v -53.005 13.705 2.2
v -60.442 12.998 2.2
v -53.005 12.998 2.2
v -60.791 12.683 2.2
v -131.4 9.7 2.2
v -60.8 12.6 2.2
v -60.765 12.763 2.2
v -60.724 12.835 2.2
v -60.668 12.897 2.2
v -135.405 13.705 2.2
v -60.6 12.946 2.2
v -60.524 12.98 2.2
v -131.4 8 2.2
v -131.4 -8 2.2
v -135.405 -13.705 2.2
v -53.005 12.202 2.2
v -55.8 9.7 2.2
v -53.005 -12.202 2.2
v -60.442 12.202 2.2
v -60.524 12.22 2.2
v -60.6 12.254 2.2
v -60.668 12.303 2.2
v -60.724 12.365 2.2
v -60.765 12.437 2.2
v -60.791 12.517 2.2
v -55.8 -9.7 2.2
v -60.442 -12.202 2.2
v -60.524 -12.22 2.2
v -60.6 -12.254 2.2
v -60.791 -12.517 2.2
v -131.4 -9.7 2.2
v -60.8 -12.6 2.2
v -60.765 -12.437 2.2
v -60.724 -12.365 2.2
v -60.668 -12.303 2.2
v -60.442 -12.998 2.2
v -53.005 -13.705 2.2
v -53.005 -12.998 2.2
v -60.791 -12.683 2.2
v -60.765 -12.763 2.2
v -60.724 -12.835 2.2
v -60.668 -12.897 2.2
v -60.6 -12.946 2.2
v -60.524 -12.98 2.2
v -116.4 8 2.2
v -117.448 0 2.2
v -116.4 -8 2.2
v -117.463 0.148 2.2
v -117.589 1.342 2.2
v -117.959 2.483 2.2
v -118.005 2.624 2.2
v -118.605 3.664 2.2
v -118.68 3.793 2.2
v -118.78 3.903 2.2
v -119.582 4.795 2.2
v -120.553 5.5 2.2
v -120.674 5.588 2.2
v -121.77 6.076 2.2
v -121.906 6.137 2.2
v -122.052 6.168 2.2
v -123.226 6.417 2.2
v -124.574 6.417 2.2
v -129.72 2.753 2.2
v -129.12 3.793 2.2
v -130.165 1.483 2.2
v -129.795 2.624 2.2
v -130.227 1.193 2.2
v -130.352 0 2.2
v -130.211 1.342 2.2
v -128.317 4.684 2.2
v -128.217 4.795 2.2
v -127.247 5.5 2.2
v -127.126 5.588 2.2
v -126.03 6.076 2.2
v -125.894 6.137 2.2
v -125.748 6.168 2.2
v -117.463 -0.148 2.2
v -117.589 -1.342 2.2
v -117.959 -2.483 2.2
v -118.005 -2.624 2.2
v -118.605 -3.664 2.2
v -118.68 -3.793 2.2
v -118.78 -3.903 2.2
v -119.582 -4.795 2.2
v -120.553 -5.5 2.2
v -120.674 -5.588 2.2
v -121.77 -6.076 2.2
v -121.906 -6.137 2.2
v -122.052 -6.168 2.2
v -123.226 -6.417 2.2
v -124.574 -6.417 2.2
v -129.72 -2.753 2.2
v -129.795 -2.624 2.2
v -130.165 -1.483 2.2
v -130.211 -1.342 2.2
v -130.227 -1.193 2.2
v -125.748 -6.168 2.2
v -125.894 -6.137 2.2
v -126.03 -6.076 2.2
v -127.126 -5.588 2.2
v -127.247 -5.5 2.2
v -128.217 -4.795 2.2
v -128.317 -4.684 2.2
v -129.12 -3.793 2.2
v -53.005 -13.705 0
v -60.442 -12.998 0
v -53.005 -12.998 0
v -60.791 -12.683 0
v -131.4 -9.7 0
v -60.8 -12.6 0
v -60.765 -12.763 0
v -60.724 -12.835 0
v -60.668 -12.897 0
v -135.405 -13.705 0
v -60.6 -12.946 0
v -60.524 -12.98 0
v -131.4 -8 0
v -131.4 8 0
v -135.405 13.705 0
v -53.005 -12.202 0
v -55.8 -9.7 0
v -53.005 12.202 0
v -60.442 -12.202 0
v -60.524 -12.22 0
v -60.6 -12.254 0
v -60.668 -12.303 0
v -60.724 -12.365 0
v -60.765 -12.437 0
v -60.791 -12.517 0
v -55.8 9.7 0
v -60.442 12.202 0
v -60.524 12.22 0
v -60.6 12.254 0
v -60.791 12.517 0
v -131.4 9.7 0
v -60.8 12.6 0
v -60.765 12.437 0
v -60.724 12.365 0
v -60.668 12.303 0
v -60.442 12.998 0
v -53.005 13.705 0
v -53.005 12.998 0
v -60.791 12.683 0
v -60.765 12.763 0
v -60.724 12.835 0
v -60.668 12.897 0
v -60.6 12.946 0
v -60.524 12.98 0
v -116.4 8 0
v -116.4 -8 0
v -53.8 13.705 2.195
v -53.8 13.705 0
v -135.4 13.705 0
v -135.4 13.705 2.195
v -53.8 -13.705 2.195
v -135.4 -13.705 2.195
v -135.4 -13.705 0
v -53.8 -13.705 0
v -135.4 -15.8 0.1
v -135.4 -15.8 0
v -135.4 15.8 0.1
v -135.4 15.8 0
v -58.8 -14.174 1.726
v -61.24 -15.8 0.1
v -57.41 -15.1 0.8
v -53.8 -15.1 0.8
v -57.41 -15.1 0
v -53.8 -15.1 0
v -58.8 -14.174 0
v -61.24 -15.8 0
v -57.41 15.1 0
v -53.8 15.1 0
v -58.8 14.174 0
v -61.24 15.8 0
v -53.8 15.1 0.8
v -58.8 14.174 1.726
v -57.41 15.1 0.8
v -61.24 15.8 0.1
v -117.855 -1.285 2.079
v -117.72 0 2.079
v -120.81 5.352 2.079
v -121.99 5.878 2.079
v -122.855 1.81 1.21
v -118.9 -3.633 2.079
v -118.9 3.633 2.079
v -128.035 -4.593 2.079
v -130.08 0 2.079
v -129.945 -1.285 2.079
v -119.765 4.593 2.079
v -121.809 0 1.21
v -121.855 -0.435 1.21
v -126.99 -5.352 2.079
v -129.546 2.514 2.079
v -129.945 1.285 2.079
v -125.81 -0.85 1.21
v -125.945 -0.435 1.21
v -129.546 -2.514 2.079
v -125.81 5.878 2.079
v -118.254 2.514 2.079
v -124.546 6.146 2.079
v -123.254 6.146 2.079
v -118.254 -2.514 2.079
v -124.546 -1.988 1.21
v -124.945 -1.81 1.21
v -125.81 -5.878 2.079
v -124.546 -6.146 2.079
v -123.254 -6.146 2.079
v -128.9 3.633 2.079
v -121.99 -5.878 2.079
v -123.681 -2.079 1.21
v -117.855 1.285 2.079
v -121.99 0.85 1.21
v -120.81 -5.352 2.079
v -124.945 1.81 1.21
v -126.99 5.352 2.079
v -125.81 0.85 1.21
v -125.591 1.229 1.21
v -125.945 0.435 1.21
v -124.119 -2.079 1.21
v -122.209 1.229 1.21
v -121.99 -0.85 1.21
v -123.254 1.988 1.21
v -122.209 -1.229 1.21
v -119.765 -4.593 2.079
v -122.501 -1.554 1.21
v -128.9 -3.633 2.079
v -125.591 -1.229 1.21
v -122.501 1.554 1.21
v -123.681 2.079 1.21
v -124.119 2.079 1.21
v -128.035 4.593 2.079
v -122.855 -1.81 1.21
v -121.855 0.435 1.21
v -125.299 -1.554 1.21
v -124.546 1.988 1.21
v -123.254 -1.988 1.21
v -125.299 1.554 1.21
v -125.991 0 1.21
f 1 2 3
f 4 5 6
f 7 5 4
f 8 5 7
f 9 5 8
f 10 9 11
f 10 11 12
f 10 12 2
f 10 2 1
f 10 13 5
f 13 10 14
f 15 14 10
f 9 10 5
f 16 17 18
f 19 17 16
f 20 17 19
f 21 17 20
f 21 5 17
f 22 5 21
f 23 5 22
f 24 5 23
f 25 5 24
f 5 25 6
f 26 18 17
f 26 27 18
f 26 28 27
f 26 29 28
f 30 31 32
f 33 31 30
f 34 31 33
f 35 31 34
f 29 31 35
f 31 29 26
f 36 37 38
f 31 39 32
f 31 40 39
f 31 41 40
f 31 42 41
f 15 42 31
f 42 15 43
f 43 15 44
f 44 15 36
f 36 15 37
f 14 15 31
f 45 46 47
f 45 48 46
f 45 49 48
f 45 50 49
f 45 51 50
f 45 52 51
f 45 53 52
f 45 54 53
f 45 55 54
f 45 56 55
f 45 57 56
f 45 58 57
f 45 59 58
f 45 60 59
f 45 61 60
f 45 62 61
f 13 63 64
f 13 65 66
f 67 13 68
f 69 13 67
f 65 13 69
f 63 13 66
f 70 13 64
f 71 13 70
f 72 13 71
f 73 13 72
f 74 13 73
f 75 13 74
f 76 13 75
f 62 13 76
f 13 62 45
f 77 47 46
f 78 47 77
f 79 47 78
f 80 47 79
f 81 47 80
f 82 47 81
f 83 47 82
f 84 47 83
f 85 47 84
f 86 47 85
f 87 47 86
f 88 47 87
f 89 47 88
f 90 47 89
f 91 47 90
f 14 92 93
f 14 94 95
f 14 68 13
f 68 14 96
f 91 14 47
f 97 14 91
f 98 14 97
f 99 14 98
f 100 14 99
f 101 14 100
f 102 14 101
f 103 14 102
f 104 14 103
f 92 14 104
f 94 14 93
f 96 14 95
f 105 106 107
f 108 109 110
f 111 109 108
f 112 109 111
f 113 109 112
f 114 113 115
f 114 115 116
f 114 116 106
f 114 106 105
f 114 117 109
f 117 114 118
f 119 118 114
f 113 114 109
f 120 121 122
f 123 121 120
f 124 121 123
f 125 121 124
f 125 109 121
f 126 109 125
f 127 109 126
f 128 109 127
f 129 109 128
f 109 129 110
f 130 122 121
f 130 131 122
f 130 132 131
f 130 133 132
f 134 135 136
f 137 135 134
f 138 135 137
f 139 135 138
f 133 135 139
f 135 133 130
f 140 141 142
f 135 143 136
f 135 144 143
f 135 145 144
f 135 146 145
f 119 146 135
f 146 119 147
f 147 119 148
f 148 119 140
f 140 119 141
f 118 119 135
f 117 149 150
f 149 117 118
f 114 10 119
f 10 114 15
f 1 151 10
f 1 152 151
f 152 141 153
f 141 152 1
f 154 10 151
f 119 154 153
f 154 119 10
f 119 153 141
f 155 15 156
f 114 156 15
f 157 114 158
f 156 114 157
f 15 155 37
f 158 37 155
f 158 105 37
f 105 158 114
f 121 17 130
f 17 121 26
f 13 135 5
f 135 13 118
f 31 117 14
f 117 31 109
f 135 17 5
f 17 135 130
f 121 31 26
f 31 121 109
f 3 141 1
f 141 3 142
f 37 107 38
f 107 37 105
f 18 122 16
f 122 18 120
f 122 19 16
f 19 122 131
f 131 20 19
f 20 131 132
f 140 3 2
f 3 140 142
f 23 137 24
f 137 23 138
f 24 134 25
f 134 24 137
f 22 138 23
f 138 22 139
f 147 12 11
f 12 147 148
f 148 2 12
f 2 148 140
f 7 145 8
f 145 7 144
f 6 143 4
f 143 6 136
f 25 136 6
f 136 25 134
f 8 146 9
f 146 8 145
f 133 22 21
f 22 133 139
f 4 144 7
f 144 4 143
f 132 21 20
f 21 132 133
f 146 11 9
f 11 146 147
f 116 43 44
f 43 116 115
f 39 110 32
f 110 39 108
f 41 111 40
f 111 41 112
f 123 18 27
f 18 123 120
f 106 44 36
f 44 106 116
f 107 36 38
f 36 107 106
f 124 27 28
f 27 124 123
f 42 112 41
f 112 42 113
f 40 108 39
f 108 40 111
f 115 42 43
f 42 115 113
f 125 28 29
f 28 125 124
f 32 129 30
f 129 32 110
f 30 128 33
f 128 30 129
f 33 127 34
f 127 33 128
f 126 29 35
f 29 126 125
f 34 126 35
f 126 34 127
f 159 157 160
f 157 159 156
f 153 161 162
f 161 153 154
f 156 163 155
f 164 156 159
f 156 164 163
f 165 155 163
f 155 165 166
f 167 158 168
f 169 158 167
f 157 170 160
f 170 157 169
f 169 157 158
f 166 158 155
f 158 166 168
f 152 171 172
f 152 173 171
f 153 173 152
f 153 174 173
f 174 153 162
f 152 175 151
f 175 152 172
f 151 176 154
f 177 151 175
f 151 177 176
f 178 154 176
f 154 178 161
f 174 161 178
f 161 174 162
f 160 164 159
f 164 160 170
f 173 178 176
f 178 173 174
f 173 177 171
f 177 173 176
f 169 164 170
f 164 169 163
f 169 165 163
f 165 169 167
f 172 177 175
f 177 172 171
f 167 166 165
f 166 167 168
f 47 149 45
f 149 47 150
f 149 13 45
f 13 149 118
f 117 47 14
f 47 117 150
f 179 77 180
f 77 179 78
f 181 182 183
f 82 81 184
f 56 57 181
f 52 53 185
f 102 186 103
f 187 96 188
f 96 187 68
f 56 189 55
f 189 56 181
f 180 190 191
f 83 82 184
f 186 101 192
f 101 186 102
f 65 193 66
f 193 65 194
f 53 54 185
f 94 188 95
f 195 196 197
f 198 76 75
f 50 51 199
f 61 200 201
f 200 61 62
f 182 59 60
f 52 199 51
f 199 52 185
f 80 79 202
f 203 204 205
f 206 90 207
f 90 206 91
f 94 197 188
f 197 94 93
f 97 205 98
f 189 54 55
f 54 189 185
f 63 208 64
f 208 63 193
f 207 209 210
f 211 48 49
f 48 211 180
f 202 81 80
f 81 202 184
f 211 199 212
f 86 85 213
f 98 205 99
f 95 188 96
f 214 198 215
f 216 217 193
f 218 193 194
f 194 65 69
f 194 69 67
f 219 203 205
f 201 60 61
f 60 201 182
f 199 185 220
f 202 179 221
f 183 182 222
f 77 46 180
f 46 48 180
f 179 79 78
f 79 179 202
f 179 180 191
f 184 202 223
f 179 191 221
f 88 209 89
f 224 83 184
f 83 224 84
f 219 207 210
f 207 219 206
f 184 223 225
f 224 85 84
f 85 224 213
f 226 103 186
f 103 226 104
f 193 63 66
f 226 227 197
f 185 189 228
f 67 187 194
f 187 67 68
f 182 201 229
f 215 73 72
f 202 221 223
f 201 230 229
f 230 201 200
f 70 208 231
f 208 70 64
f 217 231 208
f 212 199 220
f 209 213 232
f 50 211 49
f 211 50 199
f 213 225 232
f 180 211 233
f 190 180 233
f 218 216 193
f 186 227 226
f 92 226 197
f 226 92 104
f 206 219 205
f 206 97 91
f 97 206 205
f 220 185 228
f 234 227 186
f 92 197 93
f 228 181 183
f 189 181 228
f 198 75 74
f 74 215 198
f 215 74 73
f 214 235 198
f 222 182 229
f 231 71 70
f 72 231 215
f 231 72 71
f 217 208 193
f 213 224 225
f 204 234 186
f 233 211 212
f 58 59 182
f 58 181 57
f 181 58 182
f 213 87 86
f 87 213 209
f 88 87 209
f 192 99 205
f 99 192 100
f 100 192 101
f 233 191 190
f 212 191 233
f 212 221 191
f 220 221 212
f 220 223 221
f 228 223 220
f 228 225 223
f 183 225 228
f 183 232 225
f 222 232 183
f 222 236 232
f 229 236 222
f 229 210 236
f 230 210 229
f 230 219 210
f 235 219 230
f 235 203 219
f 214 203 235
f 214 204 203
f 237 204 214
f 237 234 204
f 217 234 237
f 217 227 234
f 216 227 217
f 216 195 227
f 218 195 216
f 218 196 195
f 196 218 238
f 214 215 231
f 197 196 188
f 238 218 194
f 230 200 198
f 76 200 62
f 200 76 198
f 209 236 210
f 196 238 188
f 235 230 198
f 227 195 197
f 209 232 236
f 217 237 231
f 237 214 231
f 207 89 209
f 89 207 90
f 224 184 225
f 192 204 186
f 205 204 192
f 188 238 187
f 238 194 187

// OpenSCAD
$fn=30;

/* [Global] */

// Render
Objects = "Lid"; //  [Both, Box, Lid]

// use the following syntax to add 1 or more internal x compartment lengths (mm)
y_sizes = [28];
// use the following syntax to add 1 or more internal y compartment widths (mm)
x_sizes = [40,40];
// Total height including Lid
z_size = 25;

addScurve = true;
internalDiameter = 3;
externalDiameter = 1;
copies = 1;

// Type of lid pattern
gPattern = "none"; //  [Hex, Diamond, Web, Solid, Fancy]
// Tolerance
gTol = 0.3;
// Wall Thickness
gWT = 1.2;

/* [Spider Web] */
// Amount of space from one ring or webs to the next
WebSpacing = 10;
// How many rings of webs, best of more than needed
WebStrands = 5;
// Thickness of the strands
WedThickness = 1.8;
// How many segments of web
WebWedges = 12;


/* [Hidden] */
/* Private variables */

// Box Height
TotalZ = z_size;
LidH = 2.2;
RailThick = 1.4;
RailWidth = LidH + RailThick;

function SumList(list, start, end) = (start == end) ? 0 : list[start] + SumList(list, start+1, end);
// Box Length
TotalX = SumList(x_sizes,0,len(x_sizes)) + gWT*(len(x_sizes)+1);
// Box Width 
TotalY = SumList(y_sizes,0,len(y_sizes)) + RailWidth*2 + gWT*(len(y_sizes)-1);

echo("Size: ",TotalX,TotalY);
   
// Height not counting the lid
AdjBoxHeight = TotalZ - LidH;

 module regular_polygon(order, r=1){
 	angles=[ for (i = [0:order-1]) i*(360/order) ];
 	coords=[ for (th=angles) [r*cos(th), r*sin(th)] ];
 	polygon(coords);
 }

module circle_lattice(ipX, ipY, Spacing=10, Walls=1.2)  {


   intersection() {
      square([ipX,ipY]); 
      union() {
	    for (x=[-Spacing:Spacing:ipX+Spacing]) {
           for (y=[-Spacing:Spacing:ipY+Spacing]){
	          difference()  {
			     translate([x+Spacing/2, y+Spacing/2]) circle(r=Spacing*0.75);
			     translate([x+Spacing/2, y+Spacing/2]) circle(r=(Spacing*0.75)-Walls);
		      }
           }   // end for y        
	    }  // end for x
      } // End union
   }
}


module diamond_lattice(ipX, ipY, DSize, WSize)  {

    lOffset = DSize + WSize;

	difference()  {
		square([ipX, ipY]);
		for (x=[0:lOffset:ipX]) {
            for (y=[0:lOffset:ipY]){
  			   translate([x, y])  regular_polygon(4, r=DSize/2);
			   translate([x+lOffset/2, y+lOffset/2]) regular_polygon(4, r=DSize/2);
		    }
        }        
	}
}

module hex_lattice(ipX, ipY, DSize, WSize)  {
    lXOffset = DSize + WSize;
    lYOffset = (DSize + WSize) * sqrt(3);
    r = DSize / sqrt(3);
    
    startXOffset = - lXOffset * ceil(ipX / lXOffset); 
    startYOffset = - lYOffset * ceil(ipY / lYOffset); 
    
    translate([ipX/2,ipY/2])
	difference()  {
		translate([ipX/-2,ipY/-2])
        square([ipX, ipY]);
        
		for (x=[startXOffset:lXOffset:ipX]) {
            for (y=[startYOffset:lYOffset:ipY]){
  			   translate([x, y]) rotate([0,0,30]) regular_polygon(6, r=r);
			   translate([x+lXOffset/2, y+lYOffset/2]) rotate([0,0,30]) regular_polygon(6, r=r);
		    }
        }  
	}
}

// Make a star with X points
module star(radius, wedges)
{
	angle = 360 / wedges;
	difference() {
		circle(radius, $fn = wedges);
		for(i = [0:wedges - 1]) {
			rotate(angle / 2 + angle * i) translate([radius, 0, 0]) 
			    scale([0.8, 1, 1]) 
				    circle(radius * sin(angle / 2), $fn = 24);
		}
	}
}

module spider_web(ipWebSpacing, strands, ipThickness, wedges) 
{
	for(i = [0:strands - 1]) 
    {
        difference() {
            star(ipWebSpacing * i, wedges);
            offset(r = -ipThickness) star(ipWebSpacing * i, wedges);
        }
	}

	angle = 360 / wedges;
	for(i = [0:wedges - 1])
    {
		rotate(angle * i) translate([0, -ipThickness / 2, 0]) 
			square([ipWebSpacing * strands, ipThickness]);
	}    
}


module RCube(x,y,z,ipR=4) {
    translate([-x/2,-y/2,0]) hull(){
      translate([ipR,ipR,ipR]) sphere(ipR);
      translate([x-ipR,ipR,ipR]) sphere(ipR);
      translate([ipR,y-ipR,ipR]) sphere(ipR);
      translate([x-ipR,y-ipR,ipR]) sphere(ipR);
      translate([ipR,ipR,z-ipR]) sphere(ipR);
      translate([x-ipR,ipR,z-ipR]) sphere(ipR);
      translate([ipR,y-ipR,z-ipR]) sphere(ipR);
      translate([x-ipR,y-ipR,z-ipR]) sphere(ipR);
      }  
} 

module lid2(pattern, totalX, totalY, padding, lidHeight, railWidth, tolerance, fingerCutout = true, backstop = 1) {
     lidX = totalX - backstop - .1; //remove backstop from lid
     lidY = totalY - railWidth *2 - tolerance * 2; //lid must fit between rails
   
   union () { 
       intersection () {
            difference() {
                cube([lidX, lidY, lidHeight]);
                
                translate([lidX / 2, lidY / 2,-10])
                RCube(lidX - padding * 2, lidY - padding * 2, 20, padding / 2); 
           
                // make a slot for the latch can flex         
                translate([0,lidHeight+1,-1]) RCube(18,0.85,4,0.4);
                translate([0,lidY-lidHeight-1,-1]) RCube(18,0.85,4,0.4);
                
                //remove sides
                translate([-2,0,0])
                rotate([45,0,0])
                cube([lidX + 4, lidHeight * sqrt(2), lidHeight * sqrt(2)]);
                
                translate([-2,lidY,0])
                rotate([45,0,0])
                cube([lidX + 4, lidHeight * sqrt(2), lidHeight * sqrt(2)]);
                
                if (tolerance>0)
                {
                    // cut out slots for the latch 
                    translate([7,lidY,lidHeight /2]) scale([1.5,lidHeight / 2,1]) rotate([0,0,45])
                    cube ([2+tolerance,2+tolerance,lidHeight+2], center=true);
                      
                    translate([7,0,lidHeight /2]) scale([1.5, lidHeight / 2,1]) rotate([0,0,45])
                    cube ([2+tolerance,2+tolerance,lidHeight+2], center=true);
                             
                    
                    translate([0,lidY,lidHeight /2]) scale([1.6,1.3,1]) rotate([0,0,45])
                    cube ([2+tolerance,2+tolerance,lidHeight+2], center=true);
                      
                    translate([0,0,lidHeight /2]) scale([1.6,1.3,1]) rotate([0,0,45])
                    cube ([2+tolerance,2+tolerance,lidHeight+2], center=true);
                }
            }
        
            //make the edge a little less sharp        
            translate([lidX / 2, lidY / 2, -10])
            RCube(lidX, lidY, 20, 2); 
        }
                
        //finger slot
        if (fingerCutout) {
            translate([lidX - padding / 2 - 20 ,lidY / 2 - 15,0]) 
            difference () {
                translate([10,15,0])
                scale([1,1.5,1])
                cylinder(r = 12, h = lidHeight);
                
                translate([10,15,0.4])
                scale([2,2 * 1.5,1])
                translate([0,0,9])
                sphere(r = 9);
            }
        }
        
        
        difference() {
            // Hex top
            if (pattern == "Solid") 
            {   
                    translate([padding, padding,0])
                    cube([lidX - padding * 2, lidY - padding * 2, lidHeight]); 
            }        
            
            if (pattern == "Hex") 
            {   
                    translate([padding, padding,0])
                    linear_extrude(height = lidHeight)
                    hex_lattice(
                        lidX - padding * 2,
                        lidY - padding * 2, 7, 2);      
            }        
            
            if (fingerCutout) {
                translate([lidX - padding / 2 - 20 ,lidY / 2 - 15,0]) 
                translate([10,15,-1])
                scale([1,1.5,1])
                cylinder(r = 12, h = lidHeight + 2);        
            }
        }
    }
}


module lid(ipPattern = "Hex", ipTol = 0.3){
  lAdjX = TotalX;
  lAdjY = TotalY-RailWidth*2-ipTol*2;  
  lAdjZ = LidH;
  CutX = lAdjX - 8;
  CutY = lAdjY - 8;
  lFingerX = 15;
  lFingerY = 16;  

  // main square with center removed for a pattern. 0.01 addition is a kludge to avoid a 2d surface remainging when substracting the lid from the box.
         difference() {
      translate([0,0,lAdjZ/2]) cube([lAdjX+0.01, lAdjY+0.01 , lAdjZ], center=true);

     translate([0,0,lAdjZ/2]) cube([CutX, CutY, lAdjZ], center = true);
     translate([TotalX/2-gWT/2,0,LidH/2])cube([gWT+0.01,TotalY-RailWidth,LidH],center=true);

     // make a slot for the latch can flex         
     translate([TotalX/2,TotalY/2-RailWidth-1.4,-1]) RCube(18,0.8,4,0.4);
     translate([TotalX/2,-TotalY/2+RailWidth+1.4,-1]) RCube(18,0.8,4,0.4);
  }
  
  // The Side triangles
  difference() {
    intersection () {
      union () {
          translate([-lAdjX/2,-lAdjY/2-LidH,LidH]) rotate([0,90,0]) linear_extrude(TotalX-2) polygon([[LidH,0],[LidH,LidH],[0,LidH]], paths=[[0,1,2]]);
          translate([-lAdjX/2,lAdjY/2,LidH]) rotate([0,90,0]) linear_extrude(TotalX-2) polygon([[0,0],[LidH,0],[LidH,LidH]], paths=[[0,1,2]]);
      }
      
      // check if this is real lid (ipTol>0) or negative lid (iptol = 0)
      // if real lid remove center for pattern and remove latches
      if (ipTol>0) 
         {cube([lAdjX, lAdjY + 2*LidH-0.2, lAdjZ*2], center=true);}
    }
       
    if (ipTol>0)
    {
        // cut out slots for the latch 
        translate([TotalX/2-7,lAdjY/2+RailWidth/2+ipTol,LidH/2]) scale([1.5,1,1]) rotate([0,0,45]) cube ([2+ipTol,2+ipTol,LidH+1],center=true);
          
        translate([TotalX/2-7,-lAdjY/2-RailWidth/2-ipTol,LidH/2]) scale([1.5,1,1]) rotate([0,0,45]) cube ([2+ipTol,2+ipTol,LidH+1],center=true);
  
        // trip the rail to ease going past the nub
        translate([TotalX/2,TotalY/2-LidH/2-ipTol,0]) cube([12,LidH,LidH*2],center=true); 
        translate([TotalX/2,-TotalY/2+LidH/2+ipTol,0]) cube([12,LidH,LidH*2],center=true); 
    }
    
  }
 
  // Finger slot
  difference () {
      translate([-CutX/2,-lFingerY/2,0]) cube([lFingerX, lFingerY, lAdjZ]); 
      translate([-CutX/2+lFingerX/2,0,20+LidH/2])sphere(20);     
  }


  // Solid top
  if (ipPattern == "Solid") 
      {   
       difference (){ 
         translate([-CutX/2,-CutY/2,0]) cube([CutX, CutY,   lAdjZ]);
         translate([-CutX/2,-lFingerY/2,0]) cube([lFingerX, lFingerY, lAdjZ]); 
      }
    }
    

  // Spiderweb top
  if (ipPattern == "Web") 
    {
       difference (){ 
         intersection () 
        {    
             linear_extrude(height = lAdjZ) spider_web(WebSpacing, WebStrands, WedThickness, WebWedges);  
              translate([-CutX/2,-CutY/2,0]) cube([CutX, CutY, LidH*2]); 
        }
         translate([-CutX/2,-lFingerY/2,0]) cube([lFingerX, lFingerY, lAdjZ]); 
      }
    }

  // Hex top
  if (ipPattern == "Hex") 
    {   
       difference (){ 
         translate([-CutX/2,-CutY/2,0]) linear_extrude(height = lAdjZ) hex_lattice(CutX,CutY,6,2);
         translate([-CutX/2,-lFingerY/2,0]) cube([lFingerX, lFingerY, lAdjZ]); 
      }
    }

  // Diamond top
  if (ipPattern == "Diamond") 
    {
      difference (){ 
        translate([-CutX/2,-CutY/2,0]) linear_extrude(height = lAdjZ) diamond_lattice(CutX,CutY,7,2);
        translate([-CutX/2,-lFingerY/2,0]) cube([lFingerX, lFingerY, lAdjZ]); 
      }
    }

  // fancy top
  if (ipPattern == "Fancy") 
    {
        echo(CutX,CutY);
      difference (){ 
        translate([-CutX/2,-CutY/2,0]) linear_extrude(height = lAdjZ) circle_lattice(CutX,CutY);
        translate([-CutX/2,-lFingerY/2,0]) cube([lFingerX, lFingerY, lAdjZ]); 
      }
    }

}

//=======================================
// Functions
//=======================================
function BEZ03(u) = pow((1-u), 3);
function BEZ13(u) = 3*u*(pow((1-u),2));
function BEZ23(u) = 3*(pow(u,2))*(1-u);
function BEZ33(u) = pow(u,3);

function PointAlongBez4(p0, p1, p2, p3, u) = [
	BEZ03(u)*p0[0]+BEZ13(u)*p1[0]+BEZ23(u)*p2[0]+BEZ33(u)*p3[0],
	BEZ03(u)*p0[1]+BEZ13(u)*p1[1]+BEZ23(u)*p2[1]+BEZ33(u)*p3[1]];

//=======================================
// Modules
//=======================================
// c - ControlPoints
module BezQuadCurve(c, focalPoint, steps, height)
{
	// Draw control points
	// Just comment this out when you're doing the real thing
   
	for(step = [steps:1])
	{
		linear_extrude(height = height, convexity = 10) 
		polygon(
			points=[
				focalPoint,
				PointAlongBez4(c[0], c[1], c[2],c[3], step/steps),
				PointAlongBez4(c[0], c[1], c[2],c[3], (step-1)/steps)],
			paths=[[0,1,2,0]]
		);
	}
}


module BezQuadCurve2(c, focalPoint, steps) {
    for(step = [steps:1])
	{
		polygon(
			points=[
				focalPoint,
				PointAlongBez4(c[0], c[1], c[2],c[3], step/steps),
				PointAlongBez4(c[0], c[1], c[2],c[3], (step-1)/steps)],
			paths=[[0,1,2,0]]
		);
	}
}

module box () {
    
//  Main Box
  difference() {    
    translate ([0,0,AdjBoxHeight/2]) cube([TotalX,TotalY,AdjBoxHeight], center = true);

    // Scope out compartment areas
    for(nX=[0:len(x_sizes)-1])
    {
      for(nY=[0:len(y_sizes)-1])
      {
         xOffset = SumList(x_sizes,0,nX) + gWT*(nX+1) + x_sizes[nX]/2 - TotalX/2;
         yOffset = SumList(y_sizes,0,nY) + RailWidth + gWT*nY + y_sizes[nY]/2 - TotalY/2;
          
         translate([xOffset,yOffset,gWT])
          difference () {
            RCube(x_sizes[nX], y_sizes[nY] ,AdjBoxHeight+20, internalDiameter);
            
              if (addScurve) {
                scale([x_sizes[nX] / (2 * 20),y_sizes[nY],(z_size - LidH - gWT)/10])
                translate([-20,0.5,0])
                rotate([90,0,0])
                BezQuadCurve( [[0, 10],[6,8],[0,0],[20,0]], [0,0], $fn, 1); 
              }
          }
      }
    }
  }
  

  // top rails
  difference() {
      union() {
          translate([0,-TotalY/2+RailWidth/2,AdjBoxHeight+LidH/2]) cube([TotalX,RailWidth,LidH],center = true);  
          translate([0,TotalY/2-RailWidth/2,AdjBoxHeight+LidH/2]) cube([TotalX,RailWidth,LidH],center = true);
           }
       
      // Trim each rail top to a 45 degree angle     
      translate([0,-TotalY/2,AdjBoxHeight+RailWidth]) rotate([45,0,0]) cube([TotalX,RailWidth+0.7,RailWidth+0.7], center=true); 
      translate([0,TotalY/2,AdjBoxHeight+RailWidth])  rotate([45,0,0]) cube([TotalX,RailWidth+0.7,RailWidth+0.7], center=true);  

      // Substract the lid from the rails
      translate([0,0,AdjBoxHeight]) lid(ipPattern = "Solid",ipTol =0);      
  }  
  
   // add backstop
   translate([TotalX/2-1/2,0,TotalZ-LidH/2])cube([1,TotalY-RailWidth,LidH],center=true);
  
  // create the latches 
  
    translate([TotalX/2-7,TotalY/2-0.1-RailWidth/2,TotalZ-LidH/2]) scale([1.5,1,1]) difference(){
      rotate([0,0,45]) cube ([2,2,LidH+1],center=true);
      translate([0,2,0]) cube ([4,4,LidH+2],center=true);
      translate([0,-2,0])cube([2,2,LidH+2], center=true);
      }  
    translate([TotalX/2-7,-TotalY/2+0.1+RailWidth/2,TotalZ-LidH/2]) scale([1.5,1,1]) difference(){
      rotate([0,0,45]) cube ([2,2,LidH+1],center=true);
      translate([0,-2,0]) cube ([4,4,LidH+2],center=true);
      translate([0,2,0])cube([2,2,LidH+2], center=true);
      }
  
} 

module rails(length, width, height, railThickness, lidHeight, trimSides = true, createLatches = true, backstop = 1) {
    //RailThick = 1.4;
    //RailWidth = LidH + RailThick;
    railW = railThickness + lidHeight;
      
    difference() {
        union () {
        difference() {
          union() {
              translate([0,width - railW,height])
              cube([length,railW, lidHeight]);
              
              translate([0,0,height])
              cube([length,railW, lidHeight]);     
         
               // add backstop
               translate([0,0,height])
               cube([backstop,width,lidHeight]);     
            }
            
            //remove the rails
            translate([0,railW + railThickness,height])
            rotate([45,0,0])
            translate([backstop,(railW* sqrt(2)) / -2,(railW* sqrt(2)) / -2])
            cube([length+2,railW * sqrt(2),railW * sqrt(2)]);         
            
            translate([0,width - railW - railThickness,height])
            rotate([45,0,0])
            translate([backstop,(railW* sqrt(2)) / -2,(railW* sqrt(2)) / -2])
            cube([length+2,railW * sqrt(2),railW * sqrt(2)]); 
        }
        
            //add the bottom part of the rails
            translate([0,0,height - railW])
            difference() {
            cube([length,railW,railW]);
            
            translate([-1, railW, -railW])
            rotate([45,0,0])
            cube([length+2,railW * sqrt(2) ,railW * sqrt(2)]);
        
        }
        
        translate([0,width - railW,height - railW])
         difference() {
            cube([length,railW,railW]);
            
            translate([-1, 0, -railW])
            rotate([45,0,0])
            cube([length+2,railW * sqrt(2) ,railW * sqrt(2)]);
         }
         
         if (createLatches) {
             // create the latches  
            translate([8,width-0.1-railW/2,height + lidHeight / 2]) scale([1.5,lidHeight / 2,1]) difference(){
              rotate([0,0,45]) cube ([2,2,lidHeight],center=true);
              translate([0,2,0]) cube ([4,4,lidHeight],center=true);
              translate([0,-2,0])cube([2,2,lidHeight], center=true);
            }  
            translate([8,0.1+RailWidth/2,height + lidHeight / 2]) scale([1.5,lidHeight / 2,1]) difference(){
              rotate([0,0,45]) cube ([2,2,lidHeight],center=true);
              translate([0,-2,0]) cube ([4,4,lidHeight],center=true);
              translate([0,2,0])cube([2,2,lidHeight], center=true);
           }    
       }
       
   }
       
   if (trimSides) {
        // Trim each rail top to a 45 degree angle     
        translate([0,-railThickness * sqrt(2),height + lidHeight ])
        rotate([45,0,0])
        translate([-1,(railW* sqrt(2)) / -2,(railW* sqrt(2)) / -2])
        cube([length+2,railW * sqrt(2),railW * sqrt(2)]); 
        
        translate([0,width + railThickness * sqrt(2),height + lidHeight])
        rotate([45,0,0])
        translate([-1,(railW* sqrt(2)) / -2,(railW* sqrt(2)) / -2])
        cube([length+2,railW * sqrt(2),railW * sqrt(2)]); 
    }
   }
   
   
}

// Production Box
if ((Objects == "Both") || (Objects == "Box")){
    
    for(nX=[0:copies-1]) {
        translate([0, (TotalY - LidH * 0.8) * nX, 0])
        intersection() {
            box();
            RCube(TotalX,TotalY,TotalZ,externalDiameter);
        }
    }
    
}

// Production Lid
if ((Objects == "Both")  || (Objects == "Lid")){
    for(nX=[0:copies-1]) {
        translate([-TotalX - 10, (TotalY - LidH * 0.8) * nX ,0])
        lid(ipPattern = gPattern, ipTol = gTol);
    }
}
